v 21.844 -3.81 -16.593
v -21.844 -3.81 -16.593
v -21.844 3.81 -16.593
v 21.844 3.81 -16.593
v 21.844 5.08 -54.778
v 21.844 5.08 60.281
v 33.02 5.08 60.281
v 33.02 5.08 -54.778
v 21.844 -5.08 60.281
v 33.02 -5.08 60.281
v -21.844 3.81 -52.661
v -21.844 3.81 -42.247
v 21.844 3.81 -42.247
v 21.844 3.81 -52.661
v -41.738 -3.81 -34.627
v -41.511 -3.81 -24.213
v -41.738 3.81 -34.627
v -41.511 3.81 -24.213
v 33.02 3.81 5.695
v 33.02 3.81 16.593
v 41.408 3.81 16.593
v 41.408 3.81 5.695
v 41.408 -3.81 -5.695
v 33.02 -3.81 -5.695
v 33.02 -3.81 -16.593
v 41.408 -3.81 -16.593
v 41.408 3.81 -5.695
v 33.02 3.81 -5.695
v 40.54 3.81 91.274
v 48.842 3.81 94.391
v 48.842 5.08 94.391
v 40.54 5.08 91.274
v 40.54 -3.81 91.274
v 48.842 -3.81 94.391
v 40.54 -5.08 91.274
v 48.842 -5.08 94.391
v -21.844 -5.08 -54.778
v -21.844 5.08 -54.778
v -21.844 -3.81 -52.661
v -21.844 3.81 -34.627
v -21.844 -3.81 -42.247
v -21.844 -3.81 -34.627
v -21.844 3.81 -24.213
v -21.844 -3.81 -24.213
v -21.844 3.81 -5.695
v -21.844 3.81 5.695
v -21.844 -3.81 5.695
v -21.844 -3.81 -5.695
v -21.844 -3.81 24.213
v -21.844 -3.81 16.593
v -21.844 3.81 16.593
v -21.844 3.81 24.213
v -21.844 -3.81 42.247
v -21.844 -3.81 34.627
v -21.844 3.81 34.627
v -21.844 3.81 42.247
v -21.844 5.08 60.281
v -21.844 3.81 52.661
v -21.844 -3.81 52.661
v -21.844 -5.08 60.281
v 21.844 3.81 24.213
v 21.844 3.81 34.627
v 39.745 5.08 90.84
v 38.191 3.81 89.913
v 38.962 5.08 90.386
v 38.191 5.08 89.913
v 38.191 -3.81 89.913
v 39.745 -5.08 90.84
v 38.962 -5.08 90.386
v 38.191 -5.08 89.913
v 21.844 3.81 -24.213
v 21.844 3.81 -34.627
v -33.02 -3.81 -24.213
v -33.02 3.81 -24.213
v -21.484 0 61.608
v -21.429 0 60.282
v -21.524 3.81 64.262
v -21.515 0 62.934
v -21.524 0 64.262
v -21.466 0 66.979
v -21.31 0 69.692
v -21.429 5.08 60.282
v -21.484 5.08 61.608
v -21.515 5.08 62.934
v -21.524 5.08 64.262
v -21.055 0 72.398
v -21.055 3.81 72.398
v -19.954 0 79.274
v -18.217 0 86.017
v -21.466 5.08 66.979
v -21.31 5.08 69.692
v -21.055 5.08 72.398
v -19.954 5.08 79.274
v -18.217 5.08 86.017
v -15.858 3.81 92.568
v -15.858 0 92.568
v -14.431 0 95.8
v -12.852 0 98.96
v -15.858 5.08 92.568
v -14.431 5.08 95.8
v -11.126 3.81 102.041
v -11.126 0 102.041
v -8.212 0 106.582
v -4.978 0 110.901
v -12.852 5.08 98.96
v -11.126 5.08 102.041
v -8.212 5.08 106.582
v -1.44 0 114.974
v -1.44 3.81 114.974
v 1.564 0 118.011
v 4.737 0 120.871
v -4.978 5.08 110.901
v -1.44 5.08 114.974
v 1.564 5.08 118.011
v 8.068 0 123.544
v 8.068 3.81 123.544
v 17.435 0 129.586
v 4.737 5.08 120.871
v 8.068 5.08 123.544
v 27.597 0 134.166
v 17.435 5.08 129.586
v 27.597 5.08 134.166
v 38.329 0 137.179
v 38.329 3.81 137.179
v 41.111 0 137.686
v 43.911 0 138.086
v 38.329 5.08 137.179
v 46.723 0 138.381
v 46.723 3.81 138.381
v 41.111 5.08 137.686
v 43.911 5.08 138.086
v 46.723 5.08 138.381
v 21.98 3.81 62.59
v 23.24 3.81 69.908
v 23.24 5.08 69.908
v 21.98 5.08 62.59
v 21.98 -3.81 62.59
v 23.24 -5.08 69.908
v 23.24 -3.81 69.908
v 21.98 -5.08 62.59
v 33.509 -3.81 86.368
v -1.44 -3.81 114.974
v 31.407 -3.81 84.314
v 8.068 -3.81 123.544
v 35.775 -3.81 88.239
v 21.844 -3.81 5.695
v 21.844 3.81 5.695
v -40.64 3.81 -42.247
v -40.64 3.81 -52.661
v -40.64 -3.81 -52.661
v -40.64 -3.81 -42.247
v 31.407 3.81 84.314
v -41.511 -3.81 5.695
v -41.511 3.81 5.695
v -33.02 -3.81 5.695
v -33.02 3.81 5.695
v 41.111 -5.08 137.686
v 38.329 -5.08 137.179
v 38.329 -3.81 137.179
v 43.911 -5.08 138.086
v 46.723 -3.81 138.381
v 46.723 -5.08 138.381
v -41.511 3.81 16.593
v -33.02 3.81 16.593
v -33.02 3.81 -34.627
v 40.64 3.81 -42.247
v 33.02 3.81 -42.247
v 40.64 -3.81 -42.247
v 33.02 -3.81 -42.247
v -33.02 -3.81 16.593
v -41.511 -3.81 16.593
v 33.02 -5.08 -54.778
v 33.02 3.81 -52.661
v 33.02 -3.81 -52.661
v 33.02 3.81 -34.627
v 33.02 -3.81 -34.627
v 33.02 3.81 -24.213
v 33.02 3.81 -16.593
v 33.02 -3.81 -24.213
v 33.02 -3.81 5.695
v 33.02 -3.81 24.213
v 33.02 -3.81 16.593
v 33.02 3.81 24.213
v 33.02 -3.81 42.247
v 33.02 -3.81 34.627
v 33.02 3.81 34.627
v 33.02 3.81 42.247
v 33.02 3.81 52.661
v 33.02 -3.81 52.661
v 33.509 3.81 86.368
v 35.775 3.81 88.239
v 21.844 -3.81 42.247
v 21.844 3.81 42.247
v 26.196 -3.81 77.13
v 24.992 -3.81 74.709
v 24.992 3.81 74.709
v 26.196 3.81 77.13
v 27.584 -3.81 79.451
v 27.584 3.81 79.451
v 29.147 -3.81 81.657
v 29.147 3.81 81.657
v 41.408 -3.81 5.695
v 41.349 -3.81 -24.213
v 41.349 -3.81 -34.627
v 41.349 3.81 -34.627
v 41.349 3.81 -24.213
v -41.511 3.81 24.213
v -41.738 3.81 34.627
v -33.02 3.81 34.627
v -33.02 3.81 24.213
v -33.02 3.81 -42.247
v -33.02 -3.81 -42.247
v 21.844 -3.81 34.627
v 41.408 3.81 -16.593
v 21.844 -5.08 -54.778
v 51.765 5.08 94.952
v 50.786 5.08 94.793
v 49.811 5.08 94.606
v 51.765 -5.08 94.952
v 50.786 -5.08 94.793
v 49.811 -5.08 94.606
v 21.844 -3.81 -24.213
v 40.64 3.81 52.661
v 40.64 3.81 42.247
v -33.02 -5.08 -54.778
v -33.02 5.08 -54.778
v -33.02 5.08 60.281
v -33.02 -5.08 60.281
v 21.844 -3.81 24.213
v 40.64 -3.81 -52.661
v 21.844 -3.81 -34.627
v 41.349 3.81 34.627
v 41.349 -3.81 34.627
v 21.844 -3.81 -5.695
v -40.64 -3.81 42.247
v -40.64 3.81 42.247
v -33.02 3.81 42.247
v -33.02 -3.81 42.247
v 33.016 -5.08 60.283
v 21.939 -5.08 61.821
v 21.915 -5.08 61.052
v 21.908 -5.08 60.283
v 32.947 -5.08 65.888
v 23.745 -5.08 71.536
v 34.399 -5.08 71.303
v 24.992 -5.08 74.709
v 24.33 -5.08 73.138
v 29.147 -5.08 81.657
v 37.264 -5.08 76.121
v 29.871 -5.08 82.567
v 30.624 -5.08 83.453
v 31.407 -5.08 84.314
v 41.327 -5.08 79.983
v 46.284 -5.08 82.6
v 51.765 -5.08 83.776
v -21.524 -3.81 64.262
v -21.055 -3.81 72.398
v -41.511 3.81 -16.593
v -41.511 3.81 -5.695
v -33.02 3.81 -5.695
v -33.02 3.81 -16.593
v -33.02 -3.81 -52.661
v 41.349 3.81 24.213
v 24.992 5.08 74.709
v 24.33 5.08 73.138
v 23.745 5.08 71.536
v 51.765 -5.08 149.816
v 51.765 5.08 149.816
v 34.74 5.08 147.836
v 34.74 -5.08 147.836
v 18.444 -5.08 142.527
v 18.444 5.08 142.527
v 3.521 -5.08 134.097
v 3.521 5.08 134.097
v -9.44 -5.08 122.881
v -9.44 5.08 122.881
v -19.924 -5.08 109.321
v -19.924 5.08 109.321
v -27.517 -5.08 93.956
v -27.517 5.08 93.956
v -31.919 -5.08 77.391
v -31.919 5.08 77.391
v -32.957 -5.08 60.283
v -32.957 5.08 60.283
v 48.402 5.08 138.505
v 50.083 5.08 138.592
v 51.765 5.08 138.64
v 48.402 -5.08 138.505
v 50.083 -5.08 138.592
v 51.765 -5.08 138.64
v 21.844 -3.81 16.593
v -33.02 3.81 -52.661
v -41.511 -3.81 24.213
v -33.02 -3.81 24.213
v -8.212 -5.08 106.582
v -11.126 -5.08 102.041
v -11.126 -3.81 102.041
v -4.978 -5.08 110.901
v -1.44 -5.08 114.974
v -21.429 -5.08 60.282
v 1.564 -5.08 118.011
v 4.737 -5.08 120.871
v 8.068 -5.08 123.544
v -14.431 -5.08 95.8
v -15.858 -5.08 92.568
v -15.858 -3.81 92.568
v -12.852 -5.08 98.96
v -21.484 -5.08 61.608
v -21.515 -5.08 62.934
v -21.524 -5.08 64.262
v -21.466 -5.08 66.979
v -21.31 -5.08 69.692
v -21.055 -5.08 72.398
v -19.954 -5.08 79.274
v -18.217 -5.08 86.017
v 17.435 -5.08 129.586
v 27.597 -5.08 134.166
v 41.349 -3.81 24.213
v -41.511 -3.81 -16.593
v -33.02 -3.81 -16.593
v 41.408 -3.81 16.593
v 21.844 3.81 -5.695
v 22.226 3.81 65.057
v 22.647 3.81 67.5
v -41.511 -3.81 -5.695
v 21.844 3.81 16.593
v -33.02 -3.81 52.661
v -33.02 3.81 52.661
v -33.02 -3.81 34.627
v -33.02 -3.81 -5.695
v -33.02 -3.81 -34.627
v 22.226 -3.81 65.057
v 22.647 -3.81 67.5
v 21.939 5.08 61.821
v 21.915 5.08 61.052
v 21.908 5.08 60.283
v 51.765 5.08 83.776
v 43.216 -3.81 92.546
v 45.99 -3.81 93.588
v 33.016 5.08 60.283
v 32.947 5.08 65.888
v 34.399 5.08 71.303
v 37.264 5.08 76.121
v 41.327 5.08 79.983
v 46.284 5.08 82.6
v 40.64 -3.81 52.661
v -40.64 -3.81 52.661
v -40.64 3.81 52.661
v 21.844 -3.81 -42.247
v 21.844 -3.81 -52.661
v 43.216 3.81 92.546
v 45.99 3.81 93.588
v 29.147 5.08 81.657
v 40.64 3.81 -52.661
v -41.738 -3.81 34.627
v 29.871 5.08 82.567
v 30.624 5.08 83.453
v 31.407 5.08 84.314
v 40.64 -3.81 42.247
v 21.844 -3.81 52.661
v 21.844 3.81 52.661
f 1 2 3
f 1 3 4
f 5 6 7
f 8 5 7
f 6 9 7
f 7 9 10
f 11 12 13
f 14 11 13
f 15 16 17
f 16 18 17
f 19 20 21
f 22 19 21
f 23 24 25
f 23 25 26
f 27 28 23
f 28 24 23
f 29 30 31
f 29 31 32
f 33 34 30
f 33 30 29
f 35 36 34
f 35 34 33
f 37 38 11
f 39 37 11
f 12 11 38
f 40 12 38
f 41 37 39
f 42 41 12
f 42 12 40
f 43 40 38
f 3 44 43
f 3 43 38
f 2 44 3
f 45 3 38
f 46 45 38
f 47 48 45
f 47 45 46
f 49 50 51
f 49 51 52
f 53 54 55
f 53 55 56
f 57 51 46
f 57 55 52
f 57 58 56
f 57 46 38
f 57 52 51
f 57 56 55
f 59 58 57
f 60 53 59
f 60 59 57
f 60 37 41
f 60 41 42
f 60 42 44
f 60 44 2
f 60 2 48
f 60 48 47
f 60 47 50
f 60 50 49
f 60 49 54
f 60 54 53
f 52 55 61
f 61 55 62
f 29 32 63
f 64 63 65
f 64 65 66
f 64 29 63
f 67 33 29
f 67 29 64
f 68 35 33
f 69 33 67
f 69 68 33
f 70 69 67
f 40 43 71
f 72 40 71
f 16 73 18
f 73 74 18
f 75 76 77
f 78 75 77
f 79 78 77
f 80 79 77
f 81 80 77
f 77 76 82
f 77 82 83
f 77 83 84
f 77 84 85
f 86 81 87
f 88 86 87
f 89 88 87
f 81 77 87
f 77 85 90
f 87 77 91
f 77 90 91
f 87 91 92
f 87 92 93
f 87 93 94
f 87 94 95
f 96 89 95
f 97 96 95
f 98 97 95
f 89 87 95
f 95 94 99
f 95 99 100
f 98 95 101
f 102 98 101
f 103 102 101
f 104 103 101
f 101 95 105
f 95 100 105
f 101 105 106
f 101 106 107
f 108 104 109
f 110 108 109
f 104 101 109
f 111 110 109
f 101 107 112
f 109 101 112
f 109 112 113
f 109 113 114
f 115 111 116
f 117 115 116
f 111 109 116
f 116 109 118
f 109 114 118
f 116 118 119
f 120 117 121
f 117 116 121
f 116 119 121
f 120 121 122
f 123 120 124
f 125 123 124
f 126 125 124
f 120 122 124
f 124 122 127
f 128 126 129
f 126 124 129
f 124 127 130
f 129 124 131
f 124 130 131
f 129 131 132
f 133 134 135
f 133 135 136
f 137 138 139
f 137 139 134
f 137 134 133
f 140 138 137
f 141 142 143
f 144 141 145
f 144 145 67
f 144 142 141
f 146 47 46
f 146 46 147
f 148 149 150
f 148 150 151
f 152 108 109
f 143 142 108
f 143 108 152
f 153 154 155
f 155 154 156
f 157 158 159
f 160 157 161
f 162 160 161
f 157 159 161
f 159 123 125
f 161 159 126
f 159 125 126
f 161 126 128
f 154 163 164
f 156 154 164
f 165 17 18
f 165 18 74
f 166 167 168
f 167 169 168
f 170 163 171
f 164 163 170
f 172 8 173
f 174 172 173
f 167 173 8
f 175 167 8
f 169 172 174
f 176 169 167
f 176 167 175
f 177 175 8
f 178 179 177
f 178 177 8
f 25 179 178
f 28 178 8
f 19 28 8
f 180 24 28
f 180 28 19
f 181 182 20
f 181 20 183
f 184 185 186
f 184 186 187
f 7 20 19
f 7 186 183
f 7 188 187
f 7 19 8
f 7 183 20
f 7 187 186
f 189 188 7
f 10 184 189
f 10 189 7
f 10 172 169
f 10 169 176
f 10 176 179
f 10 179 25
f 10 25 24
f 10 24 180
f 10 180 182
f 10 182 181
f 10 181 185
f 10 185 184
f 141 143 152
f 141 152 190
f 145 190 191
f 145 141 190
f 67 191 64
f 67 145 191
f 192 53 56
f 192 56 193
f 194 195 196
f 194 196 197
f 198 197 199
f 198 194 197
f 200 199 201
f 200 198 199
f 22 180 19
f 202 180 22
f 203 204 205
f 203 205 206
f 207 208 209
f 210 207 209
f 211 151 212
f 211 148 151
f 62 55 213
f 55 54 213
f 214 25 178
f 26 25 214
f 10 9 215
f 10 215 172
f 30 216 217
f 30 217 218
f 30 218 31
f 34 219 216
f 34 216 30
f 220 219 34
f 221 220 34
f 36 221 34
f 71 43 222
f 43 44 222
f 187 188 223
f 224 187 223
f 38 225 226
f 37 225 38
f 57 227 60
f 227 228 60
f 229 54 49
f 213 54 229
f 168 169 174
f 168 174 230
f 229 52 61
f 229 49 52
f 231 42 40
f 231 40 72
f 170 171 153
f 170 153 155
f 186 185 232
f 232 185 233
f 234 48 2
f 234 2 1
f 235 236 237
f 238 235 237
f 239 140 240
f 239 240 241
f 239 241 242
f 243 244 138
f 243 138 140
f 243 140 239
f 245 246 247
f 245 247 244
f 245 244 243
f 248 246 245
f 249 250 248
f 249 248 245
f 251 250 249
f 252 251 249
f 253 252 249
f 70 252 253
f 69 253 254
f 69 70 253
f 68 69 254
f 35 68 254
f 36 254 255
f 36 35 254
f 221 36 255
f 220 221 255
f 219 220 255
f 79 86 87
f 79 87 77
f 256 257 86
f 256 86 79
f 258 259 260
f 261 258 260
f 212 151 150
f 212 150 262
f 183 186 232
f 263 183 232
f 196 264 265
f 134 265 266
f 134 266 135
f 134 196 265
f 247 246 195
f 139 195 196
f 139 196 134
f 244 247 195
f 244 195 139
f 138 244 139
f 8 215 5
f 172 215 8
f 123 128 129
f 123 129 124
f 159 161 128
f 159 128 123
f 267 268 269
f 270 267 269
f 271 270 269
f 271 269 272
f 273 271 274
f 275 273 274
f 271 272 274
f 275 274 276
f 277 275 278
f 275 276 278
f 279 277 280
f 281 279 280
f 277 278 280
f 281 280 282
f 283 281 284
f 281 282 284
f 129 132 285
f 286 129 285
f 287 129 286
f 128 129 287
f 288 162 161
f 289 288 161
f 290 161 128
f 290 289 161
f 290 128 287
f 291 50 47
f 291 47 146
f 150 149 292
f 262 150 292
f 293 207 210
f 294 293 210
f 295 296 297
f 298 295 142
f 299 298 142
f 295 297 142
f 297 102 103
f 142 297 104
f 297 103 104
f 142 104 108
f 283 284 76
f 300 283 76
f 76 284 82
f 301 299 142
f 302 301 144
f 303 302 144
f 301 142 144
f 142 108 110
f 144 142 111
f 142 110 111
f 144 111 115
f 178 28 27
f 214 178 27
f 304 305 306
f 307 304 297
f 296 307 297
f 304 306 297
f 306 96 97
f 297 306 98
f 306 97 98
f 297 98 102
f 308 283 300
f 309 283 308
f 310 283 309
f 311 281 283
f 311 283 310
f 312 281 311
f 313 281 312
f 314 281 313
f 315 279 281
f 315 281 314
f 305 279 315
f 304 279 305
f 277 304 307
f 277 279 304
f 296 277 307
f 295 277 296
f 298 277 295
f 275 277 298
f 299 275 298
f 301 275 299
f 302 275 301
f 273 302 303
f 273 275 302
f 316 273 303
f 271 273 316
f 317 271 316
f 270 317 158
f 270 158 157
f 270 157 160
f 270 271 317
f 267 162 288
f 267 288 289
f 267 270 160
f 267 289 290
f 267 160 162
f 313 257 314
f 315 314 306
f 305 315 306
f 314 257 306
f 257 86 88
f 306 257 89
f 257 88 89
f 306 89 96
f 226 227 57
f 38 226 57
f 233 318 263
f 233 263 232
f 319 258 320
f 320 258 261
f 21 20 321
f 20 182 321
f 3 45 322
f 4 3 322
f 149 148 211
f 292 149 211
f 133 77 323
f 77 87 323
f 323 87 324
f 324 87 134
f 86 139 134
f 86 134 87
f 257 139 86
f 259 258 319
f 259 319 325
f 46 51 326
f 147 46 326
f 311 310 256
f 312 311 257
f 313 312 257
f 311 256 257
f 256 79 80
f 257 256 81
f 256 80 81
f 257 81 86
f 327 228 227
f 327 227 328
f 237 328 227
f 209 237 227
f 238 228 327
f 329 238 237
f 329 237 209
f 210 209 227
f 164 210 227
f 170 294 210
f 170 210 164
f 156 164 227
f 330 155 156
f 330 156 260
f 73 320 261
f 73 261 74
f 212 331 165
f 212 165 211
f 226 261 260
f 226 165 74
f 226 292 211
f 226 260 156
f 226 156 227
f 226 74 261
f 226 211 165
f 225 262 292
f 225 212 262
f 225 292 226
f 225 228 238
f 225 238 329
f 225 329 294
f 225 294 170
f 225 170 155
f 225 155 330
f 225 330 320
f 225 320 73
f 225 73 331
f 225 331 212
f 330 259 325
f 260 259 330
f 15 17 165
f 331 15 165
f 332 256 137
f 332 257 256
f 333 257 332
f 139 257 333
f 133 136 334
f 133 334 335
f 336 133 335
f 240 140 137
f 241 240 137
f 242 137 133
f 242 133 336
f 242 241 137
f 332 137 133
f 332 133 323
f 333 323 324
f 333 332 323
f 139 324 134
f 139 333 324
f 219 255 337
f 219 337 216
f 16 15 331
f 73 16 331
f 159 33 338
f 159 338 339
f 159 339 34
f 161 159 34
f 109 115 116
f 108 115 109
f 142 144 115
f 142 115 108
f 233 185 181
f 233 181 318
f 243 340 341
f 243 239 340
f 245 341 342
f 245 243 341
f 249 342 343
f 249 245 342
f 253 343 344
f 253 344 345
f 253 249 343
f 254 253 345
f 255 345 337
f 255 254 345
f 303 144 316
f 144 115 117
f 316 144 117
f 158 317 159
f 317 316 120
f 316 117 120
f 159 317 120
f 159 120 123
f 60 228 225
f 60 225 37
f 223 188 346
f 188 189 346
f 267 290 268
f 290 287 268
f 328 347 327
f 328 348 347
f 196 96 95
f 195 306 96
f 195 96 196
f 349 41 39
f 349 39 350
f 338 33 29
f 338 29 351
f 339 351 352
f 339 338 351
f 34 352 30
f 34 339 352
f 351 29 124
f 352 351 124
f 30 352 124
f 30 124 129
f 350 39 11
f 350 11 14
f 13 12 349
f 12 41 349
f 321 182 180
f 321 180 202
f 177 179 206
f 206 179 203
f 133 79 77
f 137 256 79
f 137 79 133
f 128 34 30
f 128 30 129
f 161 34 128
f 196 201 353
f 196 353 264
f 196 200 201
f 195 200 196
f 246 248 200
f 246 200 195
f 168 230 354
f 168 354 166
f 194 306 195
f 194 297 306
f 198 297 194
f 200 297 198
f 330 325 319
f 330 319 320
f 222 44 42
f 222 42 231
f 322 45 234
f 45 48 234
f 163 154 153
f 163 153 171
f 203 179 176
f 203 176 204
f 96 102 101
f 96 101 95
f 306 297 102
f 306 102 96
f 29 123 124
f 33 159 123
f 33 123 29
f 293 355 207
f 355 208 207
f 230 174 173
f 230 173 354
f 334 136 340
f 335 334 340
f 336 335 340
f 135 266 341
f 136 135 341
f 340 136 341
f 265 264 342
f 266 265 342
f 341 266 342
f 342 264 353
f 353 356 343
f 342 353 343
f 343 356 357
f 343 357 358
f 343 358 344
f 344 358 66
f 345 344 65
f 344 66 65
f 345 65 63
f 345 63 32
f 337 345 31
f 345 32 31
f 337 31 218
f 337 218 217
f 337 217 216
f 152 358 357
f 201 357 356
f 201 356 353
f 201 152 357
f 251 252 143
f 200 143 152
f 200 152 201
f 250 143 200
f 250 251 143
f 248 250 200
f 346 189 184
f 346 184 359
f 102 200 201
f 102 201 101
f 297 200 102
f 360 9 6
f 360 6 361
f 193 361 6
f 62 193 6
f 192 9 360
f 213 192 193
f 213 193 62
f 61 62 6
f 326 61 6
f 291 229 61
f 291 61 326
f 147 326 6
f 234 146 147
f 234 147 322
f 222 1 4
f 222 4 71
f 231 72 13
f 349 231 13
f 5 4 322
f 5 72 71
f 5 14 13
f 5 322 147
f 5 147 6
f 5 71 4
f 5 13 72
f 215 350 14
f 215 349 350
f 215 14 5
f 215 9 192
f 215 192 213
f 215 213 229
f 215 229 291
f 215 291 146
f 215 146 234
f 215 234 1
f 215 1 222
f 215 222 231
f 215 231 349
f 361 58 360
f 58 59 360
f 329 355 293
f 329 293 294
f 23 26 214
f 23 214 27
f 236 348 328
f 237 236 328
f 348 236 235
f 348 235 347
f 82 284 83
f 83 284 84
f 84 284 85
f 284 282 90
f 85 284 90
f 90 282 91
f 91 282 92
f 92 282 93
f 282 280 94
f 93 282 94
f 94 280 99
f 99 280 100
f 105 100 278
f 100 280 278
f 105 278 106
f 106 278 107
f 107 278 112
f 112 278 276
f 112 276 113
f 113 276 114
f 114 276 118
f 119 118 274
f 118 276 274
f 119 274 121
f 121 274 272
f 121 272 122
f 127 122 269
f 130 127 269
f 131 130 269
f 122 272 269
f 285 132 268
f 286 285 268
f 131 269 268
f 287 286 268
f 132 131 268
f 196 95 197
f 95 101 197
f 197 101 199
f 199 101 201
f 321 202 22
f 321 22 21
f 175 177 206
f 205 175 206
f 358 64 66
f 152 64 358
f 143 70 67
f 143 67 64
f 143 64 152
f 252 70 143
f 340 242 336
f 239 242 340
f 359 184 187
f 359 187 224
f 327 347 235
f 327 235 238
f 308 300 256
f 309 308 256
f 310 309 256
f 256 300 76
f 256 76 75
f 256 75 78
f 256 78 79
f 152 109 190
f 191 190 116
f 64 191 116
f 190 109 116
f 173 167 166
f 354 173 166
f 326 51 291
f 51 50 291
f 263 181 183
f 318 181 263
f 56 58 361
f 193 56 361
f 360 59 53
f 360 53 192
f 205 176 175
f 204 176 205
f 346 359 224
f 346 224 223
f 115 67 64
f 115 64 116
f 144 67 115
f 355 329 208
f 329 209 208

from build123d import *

# Parameters (mm, degrees)
F0_W          = 11.176
F0_H          = 7.62
F0_H_2        = 10.414
F0_H_3        = 10.414198041
F0_H_4        = 10.8981402591
F0_H_5        = 11.3893379234
F0_H_6        = 2.1167141254
F1_DEPTH      = 5.08
F1_DEPTH_BACK = 5.08
F0_W_2        = 43.688
F0_W_3        = 7.62
F0_W_4        = 8.491490941
F0_W_5        = 8.3875925946
F0_W_6        = 8.3293178785
F2_DEPTH      = 3.81
F2_DEPTH_BACK = 3.81
F4_DEPTH      = 5.08
F4_DEPTH_BACK = 5.08
F5_DEPTH      = 3.81
F5_DEPTH_BACK = 3.81


# Not quite as in the source:
# - a feature names something its author has since deleted; it is built from what else it names


with BuildPart() as f1:
    # F0 (on Front) → F1 (new body, two sides)
    with BuildSketch(Plane.XZ) as f1_sk:
        with Locations((-27.432, 56.4710072617)):
            Rectangle(F0_W, F0_H)
        with Locations((-27.432, 47.4540072617)):
            Rectangle(F0_W, F0_H_2)
        with Locations((-27.432, 38.4370072617)):
            Rectangle(F0_W, F0_H)
        with Locations((-27.432, 29.4199082413)):
            Rectangle(F0_W, F0_H_3)
        with Locations((-27.432, 20.4028092208)):
            Rectangle(F0_W, F0_H)
        with Locations((-27.432, 11.1437390912)):
            Rectangle(F0_W, F0_H_4)
        with Locations((-27.432, 0)):
            Rectangle(F0_W, F0_H_5)
        with Locations((-27.432, -11.1437390912)):
            Rectangle(F0_W, F0_H_4)
        with Locations((-27.432, -20.4028092208)):
            Rectangle(F0_W, F0_H)
        with Locations((-27.432, -29.4199082413)):
            Rectangle(F0_W, F0_H_3)
        with Locations((-27.432, -38.4370072617)):
            Rectangle(F0_W, F0_H)
        with Locations((-27.432, -47.4540072617)):
            Rectangle(F0_W, F0_H_2)
        with Locations((-27.432, -53.7193643245)):
            Rectangle(F0_W, F0_H_6)
    extrude(amount=F1_DEPTH)
    extrude(f1_sk.sketch, amount=-F1_DEPTH_BACK)



with BuildPart() as f1b:
    # F0 (on Front) → F1, piece 2 (new body, two sides)
    with BuildSketch(Plane.XZ) as f1_2_sk:
        with Locations((27.432, -47.4540072617)):
            Rectangle(F0_W, F0_H_2)
        with Locations((27.432, -38.4370072617)):
            Rectangle(F0_W, F0_H)
        with Locations((27.432, -29.4199082413)):
            Rectangle(F0_W, F0_H_3)
        with Locations((27.432, -20.4028092208)):
            Rectangle(F0_W, F0_H)
        with Locations((27.432, -11.1437390912)):
            Rectangle(F0_W, F0_H_4)
        with Locations((27.432, 0)):
            Rectangle(F0_W, F0_H_5)
        with Locations((27.432, 11.1437390912)):
            Rectangle(F0_W, F0_H_4)
        with Locations((27.432, 20.4028092208)):
            Rectangle(F0_W, F0_H)
        with Locations((27.432, 29.4199082413)):
            Rectangle(F0_W, F0_H_3)
        with Locations((27.432, 38.4370072617)):
            Rectangle(F0_W, F0_H)
        with Locations((27.432, 47.4540072617)):
            Rectangle(F0_W, F0_H_2)
        with Locations((27.432, 56.4710072617)):
            Rectangle(F0_W, F0_H)
        with Locations((27.432, -53.7193643245)):
            Rectangle(F0_W, F0_H_6)
    extrude(amount=F1_DEPTH)
    extrude(f1_2_sk.sketch, amount=-F1_DEPTH_BACK)


with BuildPart() as f1_1:
    add(f1.part)

    add(f1b.part)  # F2 merges F1b
    # F0 (on Front) → F2 (join, two sides)
    with BuildSketch(Plane.XZ) as f2_sk:
        with Locations((0, 29.4199082413)):
            Rectangle(F0_W_2, F0_H_3)
        with Locations((0, 47.4540072617)):
            Rectangle(F0_W_2, F0_H_2)
        with Locations((-36.83, 47.4540072617)):
            Rectangle(F0_W_3, F0_H_2)
        Polygon((-33.02, 24.2128092208), (-33.02, 34.6270072617), (-41.7378880084, 34.6270072617), (-41.511490941, 24.2128092208), align=None)
        with Locations((-37.2657454705, 11.1437390912)):
            Rectangle(F0_W_4, F0_H_4)
        with Locations((-37.2657454705, -11.1437390912)):
            Rectangle(F0_W_4, F0_H_4)
        with Locations((0, -11.1437390912)):
            Rectangle(F0_W_2, F0_H_4)
        with Locations((0, 11.1437390912)):
            Rectangle(F0_W_2, F0_H_4)
        with Locations((37.2137962973, -11.1437390912)):
            Rectangle(F0_W_5, F0_H_4)
        with Locations((37.2137962973, 11.1437390912)):
            Rectangle(F0_W_5, F0_H_4)
        with Locations((37.1846589392, 29.4199082413)):
            Rectangle(F0_W_6, F0_H_3)
        with Locations((36.83, 47.4540072617)):
            Rectangle(F0_W_3, F0_H_2)
        with Locations((37.1846589392, -29.4199082413)):
            Rectangle(F0_W_6, F0_H_3)
        with Locations((36.83, -47.4540072617)):
            Rectangle(F0_W_3, F0_H_2)
        with Locations((0, -47.4540072617)):
            Rectangle(F0_W_2, F0_H_2)
        with Locations((0, -29.4199082413)):
            Rectangle(F0_W_2, F0_H_3)
        Polygon((-33.02, -34.6270072617), (-33.02, -24.2128092208), (-41.511490941, -24.2128092208), (-41.7378880084, -34.6270072617), align=None)
        with Locations((-36.83, -47.4540072617)):
            Rectangle(F0_W_3, F0_H_2)
    extrude(amount=F2_DEPTH)
    extrude(f2_sk.sketch, amount=-F2_DEPTH_BACK)


with BuildPart() as f4:
    # F3 (on Front) → F4 (new body, two sides)
    with BuildSketch(Plane.XZ) as f4_sk:
        with BuildLine():
            ThreePointArc((46.7234483179, 138.3806666389), (49.2422027189, 138.5530795685), (51.7653487623, 138.6401657047))
            Line((51.7653487623, 138.6401657047), (51.7653487623, 149.8161657047))
            ThreePointArc((51.7653487623, 149.8161657047), (-9.4395332477, 122.8806362111), (-32.9566933215, 60.2826848626))
            Line((-32.9566933215, 60.2826848626), (-21.428527605, 60.2815099882))
            ThreePointArc((-21.428527605, 60.2815099882), (-21.5025853928, 62.2708854301), (-21.523534037, 64.2615286325))
            ThreePointArc((-21.523534037, 64.2615286325), (-21.4006641675, 68.3361772977), (-21.0554041735, 72.3980308506))
            ThreePointArc((-21.0554041735, 72.3980308506), (-19.1641769465, 82.6655299595), (-15.8580723991, 92.56845635))
            ThreePointArc((-15.8580723991, 92.56845635), (-13.6603359913, 97.3889321711), (-11.1260263684, 102.0412764398))
            ThreePointArc((-11.1260263684, 102.0412764398), (-6.6341482531, 108.7708829528), (-1.4398843374, 114.9744460578))
            ThreePointArc((-1.4398843374, 114.9744460578), (3.1297417642, 119.4636171712), (8.0676414189, 123.5442160236))
            ThreePointArc((8.0676414189, 123.5442160236), (22.4302043573, 132.0660955879), (38.328636759, 137.1793619255))
            ThreePointArc((38.328636759, 137.1793619255), (42.5089587111, 137.8993974077), (46.7234483179, 138.3806666389))
        make_face()
    extrude(amount=F4_DEPTH)
    extrude(f4_sk.sketch, amount=-F4_DEPTH_BACK)



with BuildPart() as f4b:
    # F3 (on Front) → F4, piece 2 (new body, two sides)
    with BuildSketch(Plane.XZ) as f4_2_sk:
        with BuildLine():
            ThreePointArc((33.0161936581, 60.2826066315), (37.2635168322, 76.1212177757), (51.7653487623, 83.7761657047))
            Line((51.7653487623, 83.7761657047), (51.7653487623, 94.9521657047))
            ThreePointArc((51.7653487623, 94.9521657047), (50.2978144115, 94.7028376295), (48.8422158841, 94.3913019379))
            Line((48.8422158841, 94.3913019379), (40.539710538, 91.2735568742))
            ThreePointArc((40.539710538, 91.2735568742), (39.3520349882, 90.6158567529), (38.190774115, 89.9125674487))
            Line((38.190774115, 89.9125674487), (31.4069914905, 84.3135852358))
            ThreePointArc((31.4069914905, 84.3135852358), (30.2440044025, 83.0135126621), (29.1472703966, 81.6570827214))
            Line((29.1472703966, 81.6570827214), (24.9918396341, 74.709399156))
            ThreePointArc((24.9918396341, 74.709399156), (24.0278925704, 72.340750689), (23.2395618841, 69.9080106226))
            Line((23.2395618841, 69.9080106226), (21.9797545722, 62.5895138801))
            ThreePointArc((21.9797545722, 62.5895138801), (21.9248040705, 61.4366528948), (21.9079152744, 60.2826066315))
            Line((21.9079152744, 60.2826066315), (33.0161936581, 60.2826066315))
        make_face()
    extrude(amount=F4_DEPTH)
    extrude(f4_2_sk.sketch, amount=-F4_DEPTH_BACK)


with BuildPart() as f4_1:
    add(f4.part)

    add(f4b.part)  # F5 merges F4b
    # F3 (on Front) → F5 (join, two sides)
    with BuildSketch(Plane.XZ) as f5_sk:
        with BuildLine():
            Line((-21.523534037, 64.2615286325), (21.9797545722, 62.5895138801))
            ThreePointArc((21.9797545722, 62.5895138801), (22.4149059417, 66.2822869441), (23.2395618841, 69.9080106226))
            Line((23.2395618841, 69.9080106226), (-21.0554041735, 72.3980308506))
            Line((-21.0554041735, 72.3980308506), (-21.523534037, 64.2615286325))
        make_face()
        with BuildLine():
            Line((-15.8580723991, 92.56845635), (24.9918396341, 74.709399156))
            ThreePointArc((24.9918396341, 74.709399156), (26.8678964449, 78.3038535456), (29.1472703966, 81.6570827214))
            Line((29.1472703966, 81.6570827214), (-11.1260263684, 102.0412764398))
            Line((-11.1260263684, 102.0412764398), (-15.8580723991, 92.56845635))
        make_face()
        with BuildLine():
            ThreePointArc((31.4069914905, 84.3135852358), (34.6222032412, 87.327143059), (38.190774115, 89.9125674487))
            Line((38.190774115, 89.9125674487), (8.0676414189, 123.5442160236))
            Line((8.0676414189, 123.5442160236), (-1.4398843374, 114.9744460578))
            Line((-1.4398843374, 114.9744460578), (31.4069914905, 84.3135852358))
        make_face()
        with BuildLine():
            ThreePointArc((40.539710538, 91.2735568742), (44.5917613588, 93.0966023555), (48.8422158841, 94.3913019379))
            Line((48.8422158841, 94.3913019379), (46.7234483179, 138.3806666389))
            Line((46.7234483179, 138.3806666389), (38.328636759, 137.1793619255))
            Line((38.328636759, 137.1793619255), (40.539710538, 91.2735568742))
        make_face()
    extrude(amount=F5_DEPTH)
    extrude(f5_sk.sketch, amount=-F5_DEPTH_BACK)


solid = Compound([f1_1.part, f4_1.part])
